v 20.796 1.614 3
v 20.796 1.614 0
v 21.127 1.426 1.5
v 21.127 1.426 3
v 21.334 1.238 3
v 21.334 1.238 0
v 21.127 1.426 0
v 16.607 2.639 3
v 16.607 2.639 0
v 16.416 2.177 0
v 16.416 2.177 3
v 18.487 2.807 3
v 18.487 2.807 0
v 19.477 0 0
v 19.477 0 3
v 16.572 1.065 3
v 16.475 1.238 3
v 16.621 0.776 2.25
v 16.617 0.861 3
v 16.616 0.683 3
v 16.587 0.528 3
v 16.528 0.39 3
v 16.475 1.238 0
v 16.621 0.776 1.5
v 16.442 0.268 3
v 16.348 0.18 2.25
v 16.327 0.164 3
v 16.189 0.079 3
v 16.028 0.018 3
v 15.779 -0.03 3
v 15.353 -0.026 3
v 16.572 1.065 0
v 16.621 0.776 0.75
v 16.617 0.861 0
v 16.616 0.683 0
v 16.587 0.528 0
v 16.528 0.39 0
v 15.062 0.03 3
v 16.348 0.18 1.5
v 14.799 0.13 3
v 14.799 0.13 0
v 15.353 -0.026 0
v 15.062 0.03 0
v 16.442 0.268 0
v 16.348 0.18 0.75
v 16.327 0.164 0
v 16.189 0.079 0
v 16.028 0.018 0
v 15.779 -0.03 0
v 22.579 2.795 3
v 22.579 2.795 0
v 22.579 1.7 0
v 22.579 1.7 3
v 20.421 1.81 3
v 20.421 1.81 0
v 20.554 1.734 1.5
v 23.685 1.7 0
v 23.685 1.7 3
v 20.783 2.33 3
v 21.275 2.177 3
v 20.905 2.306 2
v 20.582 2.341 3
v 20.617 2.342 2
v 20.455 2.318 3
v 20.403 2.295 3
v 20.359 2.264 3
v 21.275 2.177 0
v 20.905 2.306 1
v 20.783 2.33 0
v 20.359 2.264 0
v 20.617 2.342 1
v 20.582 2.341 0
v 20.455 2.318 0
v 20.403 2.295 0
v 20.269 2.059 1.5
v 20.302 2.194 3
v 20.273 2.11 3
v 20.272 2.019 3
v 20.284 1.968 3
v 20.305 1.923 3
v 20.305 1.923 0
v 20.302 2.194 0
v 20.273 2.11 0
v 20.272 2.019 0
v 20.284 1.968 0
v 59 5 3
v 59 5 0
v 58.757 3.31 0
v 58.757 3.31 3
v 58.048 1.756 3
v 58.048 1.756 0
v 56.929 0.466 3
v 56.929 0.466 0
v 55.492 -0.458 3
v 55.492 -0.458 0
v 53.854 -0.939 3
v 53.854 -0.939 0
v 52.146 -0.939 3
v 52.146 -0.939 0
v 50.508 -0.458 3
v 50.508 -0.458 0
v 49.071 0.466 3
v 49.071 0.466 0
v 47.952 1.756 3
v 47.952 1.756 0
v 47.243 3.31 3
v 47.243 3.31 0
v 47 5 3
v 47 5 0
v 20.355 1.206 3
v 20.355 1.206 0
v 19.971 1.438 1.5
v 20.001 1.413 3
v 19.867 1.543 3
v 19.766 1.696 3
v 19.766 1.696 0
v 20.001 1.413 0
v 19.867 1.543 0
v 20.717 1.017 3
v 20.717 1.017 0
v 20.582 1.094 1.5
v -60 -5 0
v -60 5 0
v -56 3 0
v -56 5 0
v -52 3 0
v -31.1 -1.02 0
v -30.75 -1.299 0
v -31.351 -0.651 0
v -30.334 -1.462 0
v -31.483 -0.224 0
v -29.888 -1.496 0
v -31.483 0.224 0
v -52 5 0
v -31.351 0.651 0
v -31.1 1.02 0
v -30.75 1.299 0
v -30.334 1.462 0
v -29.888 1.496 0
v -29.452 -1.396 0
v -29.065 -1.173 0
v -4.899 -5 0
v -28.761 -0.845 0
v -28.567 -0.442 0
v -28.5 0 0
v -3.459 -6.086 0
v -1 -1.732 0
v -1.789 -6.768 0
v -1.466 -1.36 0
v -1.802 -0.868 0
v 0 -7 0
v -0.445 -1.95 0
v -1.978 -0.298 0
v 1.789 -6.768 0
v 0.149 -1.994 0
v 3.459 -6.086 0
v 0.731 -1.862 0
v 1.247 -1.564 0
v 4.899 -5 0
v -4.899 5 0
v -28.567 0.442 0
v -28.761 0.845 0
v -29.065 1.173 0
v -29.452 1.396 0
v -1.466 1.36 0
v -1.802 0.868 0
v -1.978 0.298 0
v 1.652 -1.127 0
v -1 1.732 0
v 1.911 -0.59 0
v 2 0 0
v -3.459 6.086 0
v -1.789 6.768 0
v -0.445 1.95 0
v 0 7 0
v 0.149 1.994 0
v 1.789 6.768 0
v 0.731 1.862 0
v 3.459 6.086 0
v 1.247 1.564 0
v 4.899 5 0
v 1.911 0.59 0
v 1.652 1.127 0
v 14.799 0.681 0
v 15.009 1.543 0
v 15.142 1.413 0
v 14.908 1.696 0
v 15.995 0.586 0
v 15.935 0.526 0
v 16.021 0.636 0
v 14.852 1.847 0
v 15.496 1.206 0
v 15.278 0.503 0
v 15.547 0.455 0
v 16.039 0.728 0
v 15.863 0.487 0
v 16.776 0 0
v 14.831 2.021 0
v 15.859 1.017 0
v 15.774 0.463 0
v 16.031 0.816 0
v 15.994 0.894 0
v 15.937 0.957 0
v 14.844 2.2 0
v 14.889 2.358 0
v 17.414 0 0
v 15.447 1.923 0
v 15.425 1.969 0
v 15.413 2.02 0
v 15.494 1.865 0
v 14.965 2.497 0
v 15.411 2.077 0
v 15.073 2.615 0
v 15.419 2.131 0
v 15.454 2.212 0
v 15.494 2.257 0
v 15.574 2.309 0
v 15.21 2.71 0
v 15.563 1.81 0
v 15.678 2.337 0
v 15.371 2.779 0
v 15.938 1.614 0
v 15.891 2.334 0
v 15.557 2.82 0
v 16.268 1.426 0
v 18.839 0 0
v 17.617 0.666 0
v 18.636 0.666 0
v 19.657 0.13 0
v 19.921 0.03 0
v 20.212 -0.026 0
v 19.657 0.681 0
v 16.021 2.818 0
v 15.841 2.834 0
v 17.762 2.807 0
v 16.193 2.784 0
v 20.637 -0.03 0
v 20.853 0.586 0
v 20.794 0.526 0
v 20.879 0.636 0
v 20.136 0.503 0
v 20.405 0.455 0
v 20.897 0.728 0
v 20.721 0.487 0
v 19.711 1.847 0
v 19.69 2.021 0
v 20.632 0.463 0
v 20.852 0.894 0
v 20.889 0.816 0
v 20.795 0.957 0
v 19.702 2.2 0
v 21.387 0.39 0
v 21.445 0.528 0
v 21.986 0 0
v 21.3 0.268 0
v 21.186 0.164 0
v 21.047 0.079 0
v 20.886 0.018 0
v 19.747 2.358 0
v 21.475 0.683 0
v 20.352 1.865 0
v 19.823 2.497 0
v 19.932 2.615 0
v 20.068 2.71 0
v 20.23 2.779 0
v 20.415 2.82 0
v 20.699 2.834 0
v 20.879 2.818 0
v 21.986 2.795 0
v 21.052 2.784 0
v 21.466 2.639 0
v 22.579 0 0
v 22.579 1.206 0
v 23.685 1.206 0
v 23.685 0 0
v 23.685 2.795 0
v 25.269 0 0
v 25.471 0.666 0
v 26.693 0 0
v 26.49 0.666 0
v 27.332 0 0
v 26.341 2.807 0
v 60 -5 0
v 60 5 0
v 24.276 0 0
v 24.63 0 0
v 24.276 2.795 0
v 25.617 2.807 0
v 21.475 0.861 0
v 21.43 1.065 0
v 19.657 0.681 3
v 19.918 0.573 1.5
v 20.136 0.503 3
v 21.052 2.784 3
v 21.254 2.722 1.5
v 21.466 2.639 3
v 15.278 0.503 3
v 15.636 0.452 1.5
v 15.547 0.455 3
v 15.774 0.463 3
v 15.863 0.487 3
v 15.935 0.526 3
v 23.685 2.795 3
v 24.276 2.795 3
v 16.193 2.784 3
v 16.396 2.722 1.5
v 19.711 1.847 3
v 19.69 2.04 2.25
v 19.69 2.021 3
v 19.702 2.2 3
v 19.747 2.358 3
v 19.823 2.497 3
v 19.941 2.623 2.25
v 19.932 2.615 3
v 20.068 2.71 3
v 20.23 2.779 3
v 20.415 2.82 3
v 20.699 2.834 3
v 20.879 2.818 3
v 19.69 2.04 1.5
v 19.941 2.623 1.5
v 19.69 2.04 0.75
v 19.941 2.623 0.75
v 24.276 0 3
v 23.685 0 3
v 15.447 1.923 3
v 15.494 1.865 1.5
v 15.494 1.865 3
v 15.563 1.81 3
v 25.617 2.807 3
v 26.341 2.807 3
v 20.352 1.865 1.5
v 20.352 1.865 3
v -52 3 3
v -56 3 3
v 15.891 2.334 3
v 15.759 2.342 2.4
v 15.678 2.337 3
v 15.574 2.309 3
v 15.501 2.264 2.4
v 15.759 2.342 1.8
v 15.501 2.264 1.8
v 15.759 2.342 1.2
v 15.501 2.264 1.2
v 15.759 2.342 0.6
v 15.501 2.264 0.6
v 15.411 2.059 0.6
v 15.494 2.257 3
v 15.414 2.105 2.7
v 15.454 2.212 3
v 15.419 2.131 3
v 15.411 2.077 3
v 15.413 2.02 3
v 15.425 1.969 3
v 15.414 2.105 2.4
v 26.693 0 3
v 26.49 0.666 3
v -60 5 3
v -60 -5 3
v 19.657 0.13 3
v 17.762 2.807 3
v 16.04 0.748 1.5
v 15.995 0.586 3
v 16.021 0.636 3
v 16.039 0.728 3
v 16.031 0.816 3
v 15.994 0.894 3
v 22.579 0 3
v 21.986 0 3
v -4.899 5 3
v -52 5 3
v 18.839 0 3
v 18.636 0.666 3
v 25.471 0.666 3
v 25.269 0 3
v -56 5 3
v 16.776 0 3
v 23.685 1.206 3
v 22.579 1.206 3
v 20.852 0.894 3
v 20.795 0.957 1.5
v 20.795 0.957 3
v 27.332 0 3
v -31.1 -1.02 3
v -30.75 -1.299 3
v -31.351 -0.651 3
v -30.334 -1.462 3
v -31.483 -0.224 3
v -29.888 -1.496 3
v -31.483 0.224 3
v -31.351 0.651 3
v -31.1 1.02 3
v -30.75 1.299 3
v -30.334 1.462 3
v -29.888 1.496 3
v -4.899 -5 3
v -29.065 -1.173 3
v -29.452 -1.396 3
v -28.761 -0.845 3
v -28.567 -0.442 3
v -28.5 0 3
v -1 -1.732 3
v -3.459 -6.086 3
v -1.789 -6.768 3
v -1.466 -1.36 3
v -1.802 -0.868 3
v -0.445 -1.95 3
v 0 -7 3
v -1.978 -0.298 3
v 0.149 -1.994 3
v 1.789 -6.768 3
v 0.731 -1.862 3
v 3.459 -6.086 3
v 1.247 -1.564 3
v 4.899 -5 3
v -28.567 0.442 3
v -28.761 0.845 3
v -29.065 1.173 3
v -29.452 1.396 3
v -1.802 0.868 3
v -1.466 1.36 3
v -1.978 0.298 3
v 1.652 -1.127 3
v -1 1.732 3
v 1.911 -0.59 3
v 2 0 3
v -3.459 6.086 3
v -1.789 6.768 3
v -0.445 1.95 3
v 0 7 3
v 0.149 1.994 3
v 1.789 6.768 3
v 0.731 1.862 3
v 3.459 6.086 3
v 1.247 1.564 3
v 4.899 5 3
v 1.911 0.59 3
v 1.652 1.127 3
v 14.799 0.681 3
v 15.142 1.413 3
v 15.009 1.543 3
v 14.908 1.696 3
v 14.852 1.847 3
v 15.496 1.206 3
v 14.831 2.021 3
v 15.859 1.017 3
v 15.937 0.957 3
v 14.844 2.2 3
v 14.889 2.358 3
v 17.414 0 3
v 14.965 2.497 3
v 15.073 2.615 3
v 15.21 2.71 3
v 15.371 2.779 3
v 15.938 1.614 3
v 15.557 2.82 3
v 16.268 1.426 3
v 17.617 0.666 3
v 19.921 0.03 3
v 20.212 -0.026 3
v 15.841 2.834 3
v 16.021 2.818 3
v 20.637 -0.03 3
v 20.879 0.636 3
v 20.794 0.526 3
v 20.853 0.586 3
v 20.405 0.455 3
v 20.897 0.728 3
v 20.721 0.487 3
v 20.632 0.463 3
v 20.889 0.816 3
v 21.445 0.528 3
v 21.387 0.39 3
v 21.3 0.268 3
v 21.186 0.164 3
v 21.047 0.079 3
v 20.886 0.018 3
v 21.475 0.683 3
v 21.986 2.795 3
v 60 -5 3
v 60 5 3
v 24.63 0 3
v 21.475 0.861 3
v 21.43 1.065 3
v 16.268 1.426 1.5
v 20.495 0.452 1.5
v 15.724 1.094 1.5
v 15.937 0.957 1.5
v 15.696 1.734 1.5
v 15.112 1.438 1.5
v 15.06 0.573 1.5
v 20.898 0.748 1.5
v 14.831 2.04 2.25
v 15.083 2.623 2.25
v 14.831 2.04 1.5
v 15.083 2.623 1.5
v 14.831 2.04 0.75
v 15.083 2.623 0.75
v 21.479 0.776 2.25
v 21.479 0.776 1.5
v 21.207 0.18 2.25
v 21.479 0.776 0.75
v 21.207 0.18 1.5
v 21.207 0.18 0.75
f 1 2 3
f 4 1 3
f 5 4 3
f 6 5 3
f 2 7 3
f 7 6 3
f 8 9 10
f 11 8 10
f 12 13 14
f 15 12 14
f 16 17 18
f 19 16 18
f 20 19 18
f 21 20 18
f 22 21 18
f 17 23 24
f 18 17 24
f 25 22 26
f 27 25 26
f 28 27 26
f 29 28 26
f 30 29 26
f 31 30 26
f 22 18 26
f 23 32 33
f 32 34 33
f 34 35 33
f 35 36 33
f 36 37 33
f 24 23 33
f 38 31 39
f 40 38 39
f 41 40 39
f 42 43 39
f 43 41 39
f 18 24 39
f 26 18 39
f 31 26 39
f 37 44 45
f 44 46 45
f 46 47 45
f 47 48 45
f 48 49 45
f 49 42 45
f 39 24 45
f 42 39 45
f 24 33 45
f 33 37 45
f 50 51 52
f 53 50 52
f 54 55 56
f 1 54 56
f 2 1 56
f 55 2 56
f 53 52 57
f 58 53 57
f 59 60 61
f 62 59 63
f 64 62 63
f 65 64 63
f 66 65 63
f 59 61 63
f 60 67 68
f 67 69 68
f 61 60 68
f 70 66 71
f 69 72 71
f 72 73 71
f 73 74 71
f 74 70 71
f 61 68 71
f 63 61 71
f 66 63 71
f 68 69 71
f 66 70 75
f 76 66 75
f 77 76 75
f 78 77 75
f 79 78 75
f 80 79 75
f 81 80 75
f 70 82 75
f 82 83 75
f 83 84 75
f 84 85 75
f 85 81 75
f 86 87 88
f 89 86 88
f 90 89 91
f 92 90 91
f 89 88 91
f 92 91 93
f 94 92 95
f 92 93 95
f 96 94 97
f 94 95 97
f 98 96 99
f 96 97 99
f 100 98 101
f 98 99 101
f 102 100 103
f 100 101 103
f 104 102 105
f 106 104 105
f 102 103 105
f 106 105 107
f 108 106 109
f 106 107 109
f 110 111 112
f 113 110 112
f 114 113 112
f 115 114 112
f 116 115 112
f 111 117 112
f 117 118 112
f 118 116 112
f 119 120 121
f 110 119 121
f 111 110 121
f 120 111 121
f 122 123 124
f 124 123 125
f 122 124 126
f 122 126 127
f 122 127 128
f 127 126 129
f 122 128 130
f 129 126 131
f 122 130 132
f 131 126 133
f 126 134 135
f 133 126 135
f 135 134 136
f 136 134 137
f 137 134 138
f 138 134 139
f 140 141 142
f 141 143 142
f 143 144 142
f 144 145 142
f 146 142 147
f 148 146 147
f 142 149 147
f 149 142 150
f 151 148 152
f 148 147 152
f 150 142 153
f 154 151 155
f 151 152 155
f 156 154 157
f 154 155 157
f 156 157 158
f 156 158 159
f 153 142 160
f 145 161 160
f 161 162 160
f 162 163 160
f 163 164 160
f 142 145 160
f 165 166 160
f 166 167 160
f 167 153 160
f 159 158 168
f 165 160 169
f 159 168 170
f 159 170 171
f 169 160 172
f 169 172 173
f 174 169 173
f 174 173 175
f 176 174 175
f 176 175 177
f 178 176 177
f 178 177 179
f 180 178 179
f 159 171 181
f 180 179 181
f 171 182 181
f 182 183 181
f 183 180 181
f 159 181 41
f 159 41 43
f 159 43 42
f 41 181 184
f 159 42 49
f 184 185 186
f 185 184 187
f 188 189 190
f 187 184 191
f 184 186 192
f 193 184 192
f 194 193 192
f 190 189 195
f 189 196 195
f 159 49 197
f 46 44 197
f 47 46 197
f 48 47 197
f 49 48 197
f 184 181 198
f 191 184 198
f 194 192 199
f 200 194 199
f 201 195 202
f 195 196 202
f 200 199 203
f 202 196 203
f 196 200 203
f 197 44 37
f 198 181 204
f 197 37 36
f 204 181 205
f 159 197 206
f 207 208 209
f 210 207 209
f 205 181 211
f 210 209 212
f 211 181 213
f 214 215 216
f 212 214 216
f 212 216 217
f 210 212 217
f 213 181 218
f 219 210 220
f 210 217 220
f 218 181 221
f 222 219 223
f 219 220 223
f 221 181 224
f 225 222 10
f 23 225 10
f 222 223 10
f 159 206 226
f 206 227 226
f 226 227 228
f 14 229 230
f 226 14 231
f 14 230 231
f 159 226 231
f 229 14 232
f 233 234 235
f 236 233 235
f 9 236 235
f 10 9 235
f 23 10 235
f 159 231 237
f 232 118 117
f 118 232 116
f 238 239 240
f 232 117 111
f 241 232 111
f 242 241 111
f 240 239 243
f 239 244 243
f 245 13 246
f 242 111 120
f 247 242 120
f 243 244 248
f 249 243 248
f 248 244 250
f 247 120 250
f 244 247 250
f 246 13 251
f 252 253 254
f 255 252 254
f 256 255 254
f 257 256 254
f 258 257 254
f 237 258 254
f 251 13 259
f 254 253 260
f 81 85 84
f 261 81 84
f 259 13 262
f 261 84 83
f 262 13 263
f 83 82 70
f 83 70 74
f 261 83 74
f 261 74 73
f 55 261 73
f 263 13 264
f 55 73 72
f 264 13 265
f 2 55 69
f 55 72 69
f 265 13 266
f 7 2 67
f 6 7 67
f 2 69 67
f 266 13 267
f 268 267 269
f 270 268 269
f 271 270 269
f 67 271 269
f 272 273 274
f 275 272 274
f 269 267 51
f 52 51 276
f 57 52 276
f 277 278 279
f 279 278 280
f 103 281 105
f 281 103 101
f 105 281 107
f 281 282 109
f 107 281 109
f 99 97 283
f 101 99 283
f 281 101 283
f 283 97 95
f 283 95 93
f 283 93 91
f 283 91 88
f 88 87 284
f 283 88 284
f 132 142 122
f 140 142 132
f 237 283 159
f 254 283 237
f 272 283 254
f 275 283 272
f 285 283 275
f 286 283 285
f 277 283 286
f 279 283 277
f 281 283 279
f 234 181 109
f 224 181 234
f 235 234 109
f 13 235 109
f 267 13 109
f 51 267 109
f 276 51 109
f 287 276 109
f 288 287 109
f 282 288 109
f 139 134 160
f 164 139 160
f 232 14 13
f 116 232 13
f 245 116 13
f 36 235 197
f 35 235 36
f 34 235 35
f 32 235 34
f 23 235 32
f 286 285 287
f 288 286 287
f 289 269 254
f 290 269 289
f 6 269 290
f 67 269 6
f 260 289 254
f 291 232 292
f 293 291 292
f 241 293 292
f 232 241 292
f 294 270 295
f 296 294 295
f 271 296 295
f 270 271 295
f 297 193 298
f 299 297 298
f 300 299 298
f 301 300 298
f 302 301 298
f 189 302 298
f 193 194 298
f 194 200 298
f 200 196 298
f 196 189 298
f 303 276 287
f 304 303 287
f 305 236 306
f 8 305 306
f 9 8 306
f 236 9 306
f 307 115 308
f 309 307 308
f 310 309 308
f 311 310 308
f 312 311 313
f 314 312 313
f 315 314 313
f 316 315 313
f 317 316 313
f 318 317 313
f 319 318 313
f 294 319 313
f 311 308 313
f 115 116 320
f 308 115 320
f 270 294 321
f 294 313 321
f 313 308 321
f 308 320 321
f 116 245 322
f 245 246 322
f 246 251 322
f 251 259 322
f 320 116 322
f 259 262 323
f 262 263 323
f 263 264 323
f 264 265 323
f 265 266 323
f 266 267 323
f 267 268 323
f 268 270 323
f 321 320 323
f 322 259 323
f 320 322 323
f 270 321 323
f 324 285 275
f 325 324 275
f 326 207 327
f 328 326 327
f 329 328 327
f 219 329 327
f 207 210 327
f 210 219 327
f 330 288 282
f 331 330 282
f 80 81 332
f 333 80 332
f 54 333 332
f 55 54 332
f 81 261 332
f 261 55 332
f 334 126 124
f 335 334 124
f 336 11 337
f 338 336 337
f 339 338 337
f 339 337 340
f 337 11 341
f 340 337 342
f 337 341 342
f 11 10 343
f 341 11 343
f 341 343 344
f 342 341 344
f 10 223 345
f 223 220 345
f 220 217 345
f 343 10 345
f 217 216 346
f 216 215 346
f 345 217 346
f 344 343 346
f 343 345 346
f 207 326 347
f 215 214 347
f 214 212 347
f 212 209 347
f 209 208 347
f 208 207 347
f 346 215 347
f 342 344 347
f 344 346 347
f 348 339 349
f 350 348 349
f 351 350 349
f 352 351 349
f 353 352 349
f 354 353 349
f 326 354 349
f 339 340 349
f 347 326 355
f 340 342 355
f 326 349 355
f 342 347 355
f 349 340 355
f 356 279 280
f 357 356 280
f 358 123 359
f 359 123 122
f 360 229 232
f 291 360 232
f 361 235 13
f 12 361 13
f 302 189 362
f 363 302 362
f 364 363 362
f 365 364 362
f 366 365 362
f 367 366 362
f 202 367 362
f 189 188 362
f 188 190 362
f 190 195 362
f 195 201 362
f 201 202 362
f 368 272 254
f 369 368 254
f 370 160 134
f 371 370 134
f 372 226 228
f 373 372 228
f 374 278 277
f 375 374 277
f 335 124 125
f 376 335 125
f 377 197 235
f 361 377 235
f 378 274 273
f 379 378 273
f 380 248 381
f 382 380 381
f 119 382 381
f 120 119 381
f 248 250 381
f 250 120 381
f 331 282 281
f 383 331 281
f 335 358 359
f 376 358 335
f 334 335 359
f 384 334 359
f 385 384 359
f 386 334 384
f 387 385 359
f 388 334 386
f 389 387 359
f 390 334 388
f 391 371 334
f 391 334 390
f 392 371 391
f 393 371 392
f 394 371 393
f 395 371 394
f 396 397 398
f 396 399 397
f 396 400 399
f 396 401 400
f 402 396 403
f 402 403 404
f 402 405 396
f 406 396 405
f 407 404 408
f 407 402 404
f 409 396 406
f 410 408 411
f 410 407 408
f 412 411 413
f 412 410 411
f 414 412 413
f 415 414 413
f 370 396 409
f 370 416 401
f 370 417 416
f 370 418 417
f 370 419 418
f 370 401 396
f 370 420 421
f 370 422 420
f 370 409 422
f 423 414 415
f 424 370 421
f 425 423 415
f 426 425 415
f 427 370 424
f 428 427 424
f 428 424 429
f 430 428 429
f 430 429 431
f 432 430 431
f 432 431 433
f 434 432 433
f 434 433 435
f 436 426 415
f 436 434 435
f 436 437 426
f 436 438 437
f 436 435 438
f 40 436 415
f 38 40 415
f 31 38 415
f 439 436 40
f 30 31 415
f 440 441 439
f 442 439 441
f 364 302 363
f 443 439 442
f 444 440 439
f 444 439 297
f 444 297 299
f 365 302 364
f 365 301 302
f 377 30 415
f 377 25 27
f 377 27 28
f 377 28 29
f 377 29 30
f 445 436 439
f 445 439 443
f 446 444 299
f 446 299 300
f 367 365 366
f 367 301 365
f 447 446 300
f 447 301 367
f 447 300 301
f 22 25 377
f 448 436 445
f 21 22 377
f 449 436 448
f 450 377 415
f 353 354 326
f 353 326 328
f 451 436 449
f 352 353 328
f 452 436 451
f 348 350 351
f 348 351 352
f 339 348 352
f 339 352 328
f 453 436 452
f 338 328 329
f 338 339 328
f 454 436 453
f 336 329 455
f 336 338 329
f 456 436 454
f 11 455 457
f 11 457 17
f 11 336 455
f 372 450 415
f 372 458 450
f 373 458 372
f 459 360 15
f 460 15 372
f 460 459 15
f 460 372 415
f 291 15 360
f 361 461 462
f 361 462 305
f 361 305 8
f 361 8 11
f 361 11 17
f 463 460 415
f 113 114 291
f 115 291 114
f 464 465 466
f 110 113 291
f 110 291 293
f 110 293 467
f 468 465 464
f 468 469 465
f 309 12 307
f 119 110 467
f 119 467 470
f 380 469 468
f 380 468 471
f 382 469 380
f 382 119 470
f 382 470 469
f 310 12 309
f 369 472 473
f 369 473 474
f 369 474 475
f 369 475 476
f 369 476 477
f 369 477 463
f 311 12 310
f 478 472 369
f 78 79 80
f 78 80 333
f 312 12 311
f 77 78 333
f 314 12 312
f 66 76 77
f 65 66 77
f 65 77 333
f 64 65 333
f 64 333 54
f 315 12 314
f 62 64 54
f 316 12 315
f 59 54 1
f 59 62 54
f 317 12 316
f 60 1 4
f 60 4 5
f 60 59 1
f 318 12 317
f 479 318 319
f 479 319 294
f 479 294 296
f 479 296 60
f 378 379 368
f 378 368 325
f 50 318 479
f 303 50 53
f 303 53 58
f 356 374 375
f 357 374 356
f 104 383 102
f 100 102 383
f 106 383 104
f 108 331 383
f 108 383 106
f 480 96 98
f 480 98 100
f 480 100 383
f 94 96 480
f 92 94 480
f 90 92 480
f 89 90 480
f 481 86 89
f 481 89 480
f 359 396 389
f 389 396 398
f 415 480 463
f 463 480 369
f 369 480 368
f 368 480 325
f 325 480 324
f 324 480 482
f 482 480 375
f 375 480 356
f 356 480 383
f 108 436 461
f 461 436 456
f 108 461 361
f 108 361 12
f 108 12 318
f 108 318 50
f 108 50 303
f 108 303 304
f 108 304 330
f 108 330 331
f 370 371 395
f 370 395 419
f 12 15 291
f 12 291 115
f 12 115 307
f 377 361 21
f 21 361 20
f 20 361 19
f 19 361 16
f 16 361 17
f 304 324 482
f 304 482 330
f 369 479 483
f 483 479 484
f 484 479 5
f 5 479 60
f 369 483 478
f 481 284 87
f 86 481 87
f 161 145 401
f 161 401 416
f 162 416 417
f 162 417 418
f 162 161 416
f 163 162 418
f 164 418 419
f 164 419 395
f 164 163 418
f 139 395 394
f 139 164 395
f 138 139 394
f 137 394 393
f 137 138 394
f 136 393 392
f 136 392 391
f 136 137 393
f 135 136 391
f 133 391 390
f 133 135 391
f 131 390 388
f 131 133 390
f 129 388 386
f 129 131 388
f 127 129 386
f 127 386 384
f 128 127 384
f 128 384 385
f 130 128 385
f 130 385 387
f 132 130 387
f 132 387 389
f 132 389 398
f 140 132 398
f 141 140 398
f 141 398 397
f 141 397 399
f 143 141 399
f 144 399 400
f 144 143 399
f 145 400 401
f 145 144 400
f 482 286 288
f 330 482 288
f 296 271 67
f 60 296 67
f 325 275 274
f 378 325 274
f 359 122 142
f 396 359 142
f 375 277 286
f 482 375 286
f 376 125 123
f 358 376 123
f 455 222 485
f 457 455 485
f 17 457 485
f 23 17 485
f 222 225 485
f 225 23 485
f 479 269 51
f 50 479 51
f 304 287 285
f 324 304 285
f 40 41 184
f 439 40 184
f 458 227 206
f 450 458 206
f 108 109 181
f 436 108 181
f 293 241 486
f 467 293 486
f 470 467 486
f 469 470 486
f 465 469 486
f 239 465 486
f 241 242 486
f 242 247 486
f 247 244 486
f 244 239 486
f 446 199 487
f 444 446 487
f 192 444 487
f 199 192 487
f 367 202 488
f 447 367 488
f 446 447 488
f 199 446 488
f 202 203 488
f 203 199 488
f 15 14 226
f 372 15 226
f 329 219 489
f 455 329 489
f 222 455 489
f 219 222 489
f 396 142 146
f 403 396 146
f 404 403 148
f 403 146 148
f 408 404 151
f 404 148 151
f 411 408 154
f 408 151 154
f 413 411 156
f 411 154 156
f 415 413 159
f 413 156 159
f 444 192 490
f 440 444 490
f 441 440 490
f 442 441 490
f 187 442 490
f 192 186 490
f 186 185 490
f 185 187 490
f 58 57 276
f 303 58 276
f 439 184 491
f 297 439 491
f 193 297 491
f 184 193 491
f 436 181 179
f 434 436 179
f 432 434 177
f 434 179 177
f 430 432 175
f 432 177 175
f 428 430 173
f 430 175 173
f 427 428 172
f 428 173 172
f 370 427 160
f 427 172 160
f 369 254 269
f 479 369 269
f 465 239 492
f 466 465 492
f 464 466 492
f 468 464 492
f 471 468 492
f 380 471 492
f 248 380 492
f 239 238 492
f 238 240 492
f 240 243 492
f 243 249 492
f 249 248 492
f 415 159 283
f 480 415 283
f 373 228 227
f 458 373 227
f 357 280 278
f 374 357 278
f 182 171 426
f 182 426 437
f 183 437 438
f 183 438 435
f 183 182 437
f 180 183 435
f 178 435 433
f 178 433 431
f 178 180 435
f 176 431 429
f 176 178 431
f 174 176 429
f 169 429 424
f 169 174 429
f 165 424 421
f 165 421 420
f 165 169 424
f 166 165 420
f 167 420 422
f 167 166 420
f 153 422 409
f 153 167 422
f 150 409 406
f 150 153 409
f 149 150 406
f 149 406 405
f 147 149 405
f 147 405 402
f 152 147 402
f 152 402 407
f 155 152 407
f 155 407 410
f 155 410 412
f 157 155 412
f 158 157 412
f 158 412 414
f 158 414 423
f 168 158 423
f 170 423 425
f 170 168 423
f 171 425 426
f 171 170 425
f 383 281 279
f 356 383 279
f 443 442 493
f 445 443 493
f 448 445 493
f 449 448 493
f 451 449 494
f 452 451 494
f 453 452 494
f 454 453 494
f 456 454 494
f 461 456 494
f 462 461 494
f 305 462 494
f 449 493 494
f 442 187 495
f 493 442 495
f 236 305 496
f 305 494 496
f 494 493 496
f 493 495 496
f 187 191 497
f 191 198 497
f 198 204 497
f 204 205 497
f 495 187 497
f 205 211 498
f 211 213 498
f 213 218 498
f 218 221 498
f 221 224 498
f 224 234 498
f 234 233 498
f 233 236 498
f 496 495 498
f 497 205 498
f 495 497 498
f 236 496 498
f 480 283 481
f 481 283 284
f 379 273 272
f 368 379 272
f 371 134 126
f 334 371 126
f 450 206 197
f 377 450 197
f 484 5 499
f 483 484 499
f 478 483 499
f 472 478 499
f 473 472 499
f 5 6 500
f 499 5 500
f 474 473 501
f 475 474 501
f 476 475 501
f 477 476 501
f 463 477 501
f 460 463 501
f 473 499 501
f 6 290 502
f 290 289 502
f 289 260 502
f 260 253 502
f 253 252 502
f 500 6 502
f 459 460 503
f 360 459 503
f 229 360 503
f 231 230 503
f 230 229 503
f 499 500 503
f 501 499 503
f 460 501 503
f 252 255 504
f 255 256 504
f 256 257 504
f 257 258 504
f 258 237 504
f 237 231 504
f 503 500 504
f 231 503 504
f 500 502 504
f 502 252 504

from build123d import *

# Parameters (mm, degrees)
F0_R     = 1.5
F0_R_2   = 2
F1_DEPTH = 3


with BuildPart() as f1:
    # F0 (on Top) → F1 (new body)
    with BuildSketch(Plane.XY):
        with BuildLine():
            Line((-56, 5), (-60, 5))
            Line((-60, 5), (-60, -5))
            Line((-60, -5), (-4.8989794856, -5))
            ThreePointArc((-4.8989794856, -5), (-7, 0), (-4.8989794856, 5))
            Line((-4.8989794856, 5), (-52, 5))
            Line((-52, 5), (-52, 3))
            Line((-52, 3), (-56, 3))
            Line((-56, 3), (-56, 5))
        make_face()
        with Locations((-30, 0)):
            Circle(F0_R, mode=Mode.SUBTRACT)
        with BuildLine():
            ThreePointArc((7, 0), (6.4534043883, -2.7117470016), (4.8989794856, -5))
            Line((4.8989794856, -5), (60, -5))
            Line((60, -5), (60, 5))
            Line((60, 5), (59, 5))
            ThreePointArc((59, 5), (53, -1), (47, 5))
            Line((47, 5), (4.8989794856, 5))
            ThreePointArc((4.8989794856, 5), (6.4534043883, 2.7117470016), (7, 0))
        make_face()
        with BuildLine():
            add(Edge.make_bspline(
                [(16.4754206125, 1.2379939809), (16.6207250703, 1.049862946), (16.6207250703, 0.7763846611)],
                knots=[0, 0, 0, 1, 1, 1], degree=2))
            add(Edge.make_bspline(
                [(16.6207250703, 0.7763846611), (16.6207250703, 0.3976753583), (16.3481644978, 0.1795657195)],
                knots=[0, 0, 0, 1, 1, 1], degree=2))
            add(Edge.make_bspline(
                [(16.3481644978, 0.1795657195), (16.0756039253, -0.0385439193), (15.5904399881, -0.0385439193)],
                knots=[0, 0, 0, 1, 1, 1], degree=2))
            add(Edge.make_bspline(
                [(15.5904399881, -0.0385439193), (15.1425963539, -0.0385439193), (14.798760121, 0.1303151559)],
                knots=[0, 0, 0, 1, 1, 1], degree=2))
            Line((14.798760121, 0.1303151559), (14.798760121, 0.6809425751))
            add(Edge.make_bspline(
                [(14.798760121, 0.6809425751), (15.0814155295, 0.5542982687), (15.2775000716, 0.5029063762)],
                knots=[0, 0, 0, 1, 1, 1], degree=2))
            add(Edge.make_bspline(
                [(15.2775000716, 0.5029063762), (15.4735846136, 0.4515144838), (15.6363256064, 0.4515144838)],
                knots=[0, 0, 0, 1, 1, 1], degree=2))
            add(Edge.make_bspline(
                [(15.6363256064, 0.4515144838), (15.8308806279, 0.4515144838), (15.9351939334, 0.5258491854)],
                knots=[0, 0, 0, 1, 1, 1], degree=2))
            add(Edge.make_bspline(
                [(15.9351939334, 0.5258491854), (16.0395072389, 0.6001838869), (16.0395072389, 0.7476296736)],
                knots=[0, 0, 0, 1, 1, 1], degree=2))
            add(Edge.make_bspline(
                [(16.0395072389, 0.7476296736), (16.0395072389, 0.8296119783), (15.9936216207, 0.8938518439)],
                knots=[0, 0, 0, 1, 1, 1], degree=2))
            add(Edge.make_bspline(
                [(15.9936216207, 0.8938518439), (15.9477360024, 0.9580917094), (15.858717903, 1.0171312049)],
                knots=[0, 0, 0, 1, 1, 1], degree=2))
            add(Edge.make_bspline(
                [(15.858717903, 1.0171312049), (15.7696998035, 1.0761707004), (15.4962215186, 1.2064858563)],
                knots=[0, 0, 0, 1, 1, 1], degree=2))
            add(Edge.make_bspline(
                [(15.4962215186, 1.2064858563), (15.2404856728, 1.3270120803), (15.1123118458, 1.4377493724)],
                knots=[0, 0, 0, 1, 1, 1], degree=2))
            add(Edge.make_bspline(
                [(15.1123118458, 1.4377493724), (14.9841380188, 1.5484866645), (14.9076619883, 1.6959324512)],
                knots=[0, 0, 0, 1, 1, 1], degree=2))
            add(Edge.make_bspline(
                [(14.9076619883, 1.6959324512), (14.8311859579, 1.8433782379), (14.8311859579, 2.0397686841)],
                knots=[0, 0, 0, 1, 1, 1], degree=2))
            add(Edge.make_bspline(
                [(14.8311859579, 2.0397686841), (14.8311859579, 2.4111362879), (15.082639146, 2.6231278443)],
                knots=[0, 0, 0, 1, 1, 1], degree=2))
            add(Edge.make_bspline(
                [(15.082639146, 2.6231278443), (15.3340923341, 2.8351194007), (15.7776533107, 2.8351194007)],
                knots=[0, 0, 0, 1, 1, 1], degree=2))
            add(Edge.make_bspline(
                [(15.7776533107, 2.8351194007), (15.9954570454, 2.8351194007), (16.1933770122, 2.7837275083)],
                knots=[0, 0, 0, 1, 1, 1], degree=2))
            add(Edge.make_bspline(
                [(16.1933770122, 2.7837275083), (16.391296979, 2.7323356158), (16.607265289, 2.6387289545)],
                knots=[0, 0, 0, 1, 1, 1], degree=2))
            Line((16.607265289, 2.6387289545), (16.416381117, 2.1774255389))
            add(Edge.make_bspline(
                [(16.416381117, 2.1774255389), (16.1924592998, 2.2691967754), (16.0462371296, 2.3055993659)],
                knots=[0, 0, 0, 1, 1, 1], degree=2))
            add(Edge.make_bspline(
                [(16.0462371296, 2.3055993659), (15.9000149594, 2.3420019564), (15.7586872551, 2.3420019564)],
                knots=[0, 0, 0, 1, 1, 1], degree=2))
            add(Edge.make_bspline(
                [(15.7586872551, 2.3420019564), (15.5904399881, 2.3420019564), (15.5005041763, 2.2636905012)],
                knots=[0, 0, 0, 1, 1, 1], degree=2))
            add(Edge.make_bspline(
                [(15.5005041763, 2.2636905012), (15.4105683645, 2.185379046), (15.4105683645, 2.0593465479)],
                knots=[0, 0, 0, 1, 1, 1], degree=2))
            add(Edge.make_bspline(
                [(15.4105683645, 2.0593465479), (15.4105683645, 1.9810350927), (15.446970955, 1.9226074054)],
                knots=[0, 0, 0, 1, 1, 1], degree=2))
            add(Edge.make_bspline(
                [(15.446970955, 1.9226074054), (15.4833735455, 1.8641797182), (15.5626027131, 1.8097287845)],
                knots=[0, 0, 0, 1, 1, 1], degree=2))
            add(Edge.make_bspline(
                [(15.5626027131, 1.8097287845), (15.6418318806, 1.7552778508), (15.9379470705, 1.6139501465)],
                knots=[0, 0, 0, 1, 1, 1], degree=2))
            add(Edge.make_bspline(
                [(15.9379470705, 1.6139501465), (16.3301161546, 1.4261250158), (16.4754206125, 1.2379939809)],
                knots=[0, 0, 0, 1, 1, 1], degree=2))
        make_face(mode=Mode.SUBTRACT)
        Polygon((19.4772577596, 0), (18.8385299533, 0), (18.6360214247, 0.665647369), (17.6167488909, 0.665647369), (17.4142403622, 0), (16.7755125559, 0), (17.7623592528, 2.8069762215), (18.4867402132, 2.8069762215), align=None, mode=Mode.SUBTRACT)
        with BuildLine():
            add(Edge.make_bspline(
                [(21.3337898747, 1.2379939809), (21.4790943325, 1.049862946), (21.4790943325, 0.7763846611)],
                knots=[0, 0, 0, 1, 1, 1], degree=2))
            add(Edge.make_bspline(
                [(21.4790943325, 0.7763846611), (21.4790943325, 0.3976753583), (21.20653376, 0.1795657195)],
                knots=[0, 0, 0, 1, 1, 1], degree=2))
            add(Edge.make_bspline(
                [(21.20653376, 0.1795657195), (20.9339731875, -0.0385439193), (20.4488092504, -0.0385439193)],
                knots=[0, 0, 0, 1, 1, 1], degree=2))
            add(Edge.make_bspline(
                [(20.4488092504, -0.0385439193), (20.0009656161, -0.0385439193), (19.6571293832, 0.1303151559)],
                knots=[0, 0, 0, 1, 1, 1], degree=2))
            Line((19.6571293832, 0.1303151559), (19.6571293832, 0.6809425751))
            add(Edge.make_bspline(
                [(19.6571293832, 0.6809425751), (19.9397847917, 0.5542982687), (20.1358693338, 0.5029063762)],
                knots=[0, 0, 0, 1, 1, 1], degree=2))
            add(Edge.make_bspline(
                [(20.1358693338, 0.5029063762), (20.3319538758, 0.4515144838), (20.4946948686, 0.4515144838)],
                knots=[0, 0, 0, 1, 1, 1], degree=2))
            add(Edge.make_bspline(
                [(20.4946948686, 0.4515144838), (20.6892498901, 0.4515144838), (20.7935631956, 0.5258491854)],
                knots=[0, 0, 0, 1, 1, 1], degree=2))
            add(Edge.make_bspline(
                [(20.7935631956, 0.5258491854), (20.8978765011, 0.6001838869), (20.8978765011, 0.7476296736)],
                knots=[0, 0, 0, 1, 1, 1], degree=2))
            add(Edge.make_bspline(
                [(20.8978765011, 0.7476296736), (20.8978765011, 0.8296119783), (20.8519908829, 0.8938518439)],
                knots=[0, 0, 0, 1, 1, 1], degree=2))
            add(Edge.make_bspline(
                [(20.8519908829, 0.8938518439), (20.8061052646, 0.9580917094), (20.7170871652, 1.0171312049)],
                knots=[0, 0, 0, 1, 1, 1], degree=2))
            add(Edge.make_bspline(
                [(20.7170871652, 1.0171312049), (20.6280690657, 1.0761707004), (20.3545907808, 1.2064858563)],
                knots=[0, 0, 0, 1, 1, 1], degree=2))
            add(Edge.make_bspline(
                [(20.3545907808, 1.2064858563), (20.098854935, 1.3270120803), (19.970681108, 1.4377493724)],
                knots=[0, 0, 0, 1, 1, 1], degree=2))
            add(Edge.make_bspline(
                [(19.970681108, 1.4377493724), (19.842507281, 1.5484866645), (19.7660312505, 1.6959324512)],
                knots=[0, 0, 0, 1, 1, 1], degree=2))
            add(Edge.make_bspline(
                [(19.7660312505, 1.6959324512), (19.6895552201, 1.8433782379), (19.6895552201, 2.0397686841)],
                knots=[0, 0, 0, 1, 1, 1], degree=2))
            add(Edge.make_bspline(
                [(19.6895552201, 2.0397686841), (19.6895552201, 2.4111362879), (19.9410084082, 2.6231278443)],
                knots=[0, 0, 0, 1, 1, 1], degree=2))
            add(Edge.make_bspline(
                [(19.9410084082, 2.6231278443), (20.1924615963, 2.8351194007), (20.6360225729, 2.8351194007)],
                knots=[0, 0, 0, 1, 1, 1], degree=2))
            add(Edge.make_bspline(
                [(20.6360225729, 2.8351194007), (20.8538263076, 2.8351194007), (21.0517462744, 2.7837275083)],
                knots=[0, 0, 0, 1, 1, 1], degree=2))
            add(Edge.make_bspline(
                [(21.0517462744, 2.7837275083), (21.2496662412, 2.7323356158), (21.4656345512, 2.6387289545)],
                knots=[0, 0, 0, 1, 1, 1], degree=2))
            Line((21.4656345512, 2.6387289545), (21.2747503792, 2.1774255389))
            add(Edge.make_bspline(
                [(21.2747503792, 2.1774255389), (21.050828562, 2.2691967754), (20.9046063918, 2.3055993659)],
                knots=[0, 0, 0, 1, 1, 1], degree=2))
            add(Edge.make_bspline(
                [(20.9046063918, 2.3055993659), (20.7583842216, 2.3420019564), (20.6170565173, 2.3420019564)],
                knots=[0, 0, 0, 1, 1, 1], degree=2))
            add(Edge.make_bspline(
                [(20.6170565173, 2.3420019564), (20.4488092504, 2.3420019564), (20.3588734386, 2.2636905012)],
                knots=[0, 0, 0, 1, 1, 1], degree=2))
            add(Edge.make_bspline(
                [(20.3588734386, 2.2636905012), (20.2689376267, 2.185379046), (20.2689376267, 2.0593465479)],
                knots=[0, 0, 0, 1, 1, 1], degree=2))
            add(Edge.make_bspline(
                [(20.2689376267, 2.0593465479), (20.2689376267, 1.9810350927), (20.3053402172, 1.9226074054)],
                knots=[0, 0, 0, 1, 1, 1], degree=2))
            add(Edge.make_bspline(
                [(20.3053402172, 1.9226074054), (20.3417428077, 1.8641797182), (20.4209719753, 1.8097287845)],
                knots=[0, 0, 0, 1, 1, 1], degree=2))
            add(Edge.make_bspline(
                [(20.4209719753, 1.8097287845), (20.5002011428, 1.7552778508), (20.7963163327, 1.6139501465)],
                knots=[0, 0, 0, 1, 1, 1], degree=2))
            add(Edge.make_bspline(
                [(20.7963163327, 1.6139501465), (21.1884854168, 1.4261250158), (21.3337898747, 1.2379939809)],
                knots=[0, 0, 0, 1, 1, 1], degree=2))
        make_face(mode=Mode.SUBTRACT)
        Polygon((24.2762816222, 2.7953518649), (24.2762816222, 0), (23.6852748589, 0), (23.6852748589, 1.2064858563), (22.5785137462, 1.2064858563), (22.5785137462, 0), (21.9856715582, 0), (21.9856715582, 2.7953518649), (22.5785137462, 2.7953518649), (22.5785137462, 1.6996033006), (23.6852748589, 1.6996033006), (23.6852748589, 2.7953518649), align=None, mode=Mode.SUBTRACT)
        Polygon((27.3316519906, 0), (26.6929241843, 0), (26.4904156556, 0.665647369), (25.4711431219, 0.665647369), (25.2686345932, 0), (24.6299067869, 0), (25.6167534838, 2.8069762215), (26.3411344442, 2.8069762215), align=None, mode=Mode.SUBTRACT)
        with BuildLine():
            ThreePointArc((-4.8989794856, 5), (-7, 0), (-4.8989794856, -5))
            Line((-4.8989794856, -5), (4.8989794856, -5))
            ThreePointArc((4.8989794856, -5), (6.4534043883, -2.7117470016), (7, 0))
            ThreePointArc((7, 0), (6.4534043883, 2.7117470016), (4.8989794856, 5))
            Line((4.8989794856, 5), (-4.8989794856, 5))
        make_face()
        Circle(F0_R_2, mode=Mode.SUBTRACT)
        with BuildLine():
            ThreePointArc((4.8989794856, 5), (0, 7), (-4.8989794856, 5))
            Line((-4.8989794856, 5), (4.8989794856, 5))
        make_face()
        with BuildLine():
            Line((4.8989794856, -5), (-4.8989794856, -5))
            ThreePointArc((-4.8989794856, -5), (0, -7), (4.8989794856, -5))
        make_face()
    extrude(amount=F1_DEPTH)


solid = f1.part
